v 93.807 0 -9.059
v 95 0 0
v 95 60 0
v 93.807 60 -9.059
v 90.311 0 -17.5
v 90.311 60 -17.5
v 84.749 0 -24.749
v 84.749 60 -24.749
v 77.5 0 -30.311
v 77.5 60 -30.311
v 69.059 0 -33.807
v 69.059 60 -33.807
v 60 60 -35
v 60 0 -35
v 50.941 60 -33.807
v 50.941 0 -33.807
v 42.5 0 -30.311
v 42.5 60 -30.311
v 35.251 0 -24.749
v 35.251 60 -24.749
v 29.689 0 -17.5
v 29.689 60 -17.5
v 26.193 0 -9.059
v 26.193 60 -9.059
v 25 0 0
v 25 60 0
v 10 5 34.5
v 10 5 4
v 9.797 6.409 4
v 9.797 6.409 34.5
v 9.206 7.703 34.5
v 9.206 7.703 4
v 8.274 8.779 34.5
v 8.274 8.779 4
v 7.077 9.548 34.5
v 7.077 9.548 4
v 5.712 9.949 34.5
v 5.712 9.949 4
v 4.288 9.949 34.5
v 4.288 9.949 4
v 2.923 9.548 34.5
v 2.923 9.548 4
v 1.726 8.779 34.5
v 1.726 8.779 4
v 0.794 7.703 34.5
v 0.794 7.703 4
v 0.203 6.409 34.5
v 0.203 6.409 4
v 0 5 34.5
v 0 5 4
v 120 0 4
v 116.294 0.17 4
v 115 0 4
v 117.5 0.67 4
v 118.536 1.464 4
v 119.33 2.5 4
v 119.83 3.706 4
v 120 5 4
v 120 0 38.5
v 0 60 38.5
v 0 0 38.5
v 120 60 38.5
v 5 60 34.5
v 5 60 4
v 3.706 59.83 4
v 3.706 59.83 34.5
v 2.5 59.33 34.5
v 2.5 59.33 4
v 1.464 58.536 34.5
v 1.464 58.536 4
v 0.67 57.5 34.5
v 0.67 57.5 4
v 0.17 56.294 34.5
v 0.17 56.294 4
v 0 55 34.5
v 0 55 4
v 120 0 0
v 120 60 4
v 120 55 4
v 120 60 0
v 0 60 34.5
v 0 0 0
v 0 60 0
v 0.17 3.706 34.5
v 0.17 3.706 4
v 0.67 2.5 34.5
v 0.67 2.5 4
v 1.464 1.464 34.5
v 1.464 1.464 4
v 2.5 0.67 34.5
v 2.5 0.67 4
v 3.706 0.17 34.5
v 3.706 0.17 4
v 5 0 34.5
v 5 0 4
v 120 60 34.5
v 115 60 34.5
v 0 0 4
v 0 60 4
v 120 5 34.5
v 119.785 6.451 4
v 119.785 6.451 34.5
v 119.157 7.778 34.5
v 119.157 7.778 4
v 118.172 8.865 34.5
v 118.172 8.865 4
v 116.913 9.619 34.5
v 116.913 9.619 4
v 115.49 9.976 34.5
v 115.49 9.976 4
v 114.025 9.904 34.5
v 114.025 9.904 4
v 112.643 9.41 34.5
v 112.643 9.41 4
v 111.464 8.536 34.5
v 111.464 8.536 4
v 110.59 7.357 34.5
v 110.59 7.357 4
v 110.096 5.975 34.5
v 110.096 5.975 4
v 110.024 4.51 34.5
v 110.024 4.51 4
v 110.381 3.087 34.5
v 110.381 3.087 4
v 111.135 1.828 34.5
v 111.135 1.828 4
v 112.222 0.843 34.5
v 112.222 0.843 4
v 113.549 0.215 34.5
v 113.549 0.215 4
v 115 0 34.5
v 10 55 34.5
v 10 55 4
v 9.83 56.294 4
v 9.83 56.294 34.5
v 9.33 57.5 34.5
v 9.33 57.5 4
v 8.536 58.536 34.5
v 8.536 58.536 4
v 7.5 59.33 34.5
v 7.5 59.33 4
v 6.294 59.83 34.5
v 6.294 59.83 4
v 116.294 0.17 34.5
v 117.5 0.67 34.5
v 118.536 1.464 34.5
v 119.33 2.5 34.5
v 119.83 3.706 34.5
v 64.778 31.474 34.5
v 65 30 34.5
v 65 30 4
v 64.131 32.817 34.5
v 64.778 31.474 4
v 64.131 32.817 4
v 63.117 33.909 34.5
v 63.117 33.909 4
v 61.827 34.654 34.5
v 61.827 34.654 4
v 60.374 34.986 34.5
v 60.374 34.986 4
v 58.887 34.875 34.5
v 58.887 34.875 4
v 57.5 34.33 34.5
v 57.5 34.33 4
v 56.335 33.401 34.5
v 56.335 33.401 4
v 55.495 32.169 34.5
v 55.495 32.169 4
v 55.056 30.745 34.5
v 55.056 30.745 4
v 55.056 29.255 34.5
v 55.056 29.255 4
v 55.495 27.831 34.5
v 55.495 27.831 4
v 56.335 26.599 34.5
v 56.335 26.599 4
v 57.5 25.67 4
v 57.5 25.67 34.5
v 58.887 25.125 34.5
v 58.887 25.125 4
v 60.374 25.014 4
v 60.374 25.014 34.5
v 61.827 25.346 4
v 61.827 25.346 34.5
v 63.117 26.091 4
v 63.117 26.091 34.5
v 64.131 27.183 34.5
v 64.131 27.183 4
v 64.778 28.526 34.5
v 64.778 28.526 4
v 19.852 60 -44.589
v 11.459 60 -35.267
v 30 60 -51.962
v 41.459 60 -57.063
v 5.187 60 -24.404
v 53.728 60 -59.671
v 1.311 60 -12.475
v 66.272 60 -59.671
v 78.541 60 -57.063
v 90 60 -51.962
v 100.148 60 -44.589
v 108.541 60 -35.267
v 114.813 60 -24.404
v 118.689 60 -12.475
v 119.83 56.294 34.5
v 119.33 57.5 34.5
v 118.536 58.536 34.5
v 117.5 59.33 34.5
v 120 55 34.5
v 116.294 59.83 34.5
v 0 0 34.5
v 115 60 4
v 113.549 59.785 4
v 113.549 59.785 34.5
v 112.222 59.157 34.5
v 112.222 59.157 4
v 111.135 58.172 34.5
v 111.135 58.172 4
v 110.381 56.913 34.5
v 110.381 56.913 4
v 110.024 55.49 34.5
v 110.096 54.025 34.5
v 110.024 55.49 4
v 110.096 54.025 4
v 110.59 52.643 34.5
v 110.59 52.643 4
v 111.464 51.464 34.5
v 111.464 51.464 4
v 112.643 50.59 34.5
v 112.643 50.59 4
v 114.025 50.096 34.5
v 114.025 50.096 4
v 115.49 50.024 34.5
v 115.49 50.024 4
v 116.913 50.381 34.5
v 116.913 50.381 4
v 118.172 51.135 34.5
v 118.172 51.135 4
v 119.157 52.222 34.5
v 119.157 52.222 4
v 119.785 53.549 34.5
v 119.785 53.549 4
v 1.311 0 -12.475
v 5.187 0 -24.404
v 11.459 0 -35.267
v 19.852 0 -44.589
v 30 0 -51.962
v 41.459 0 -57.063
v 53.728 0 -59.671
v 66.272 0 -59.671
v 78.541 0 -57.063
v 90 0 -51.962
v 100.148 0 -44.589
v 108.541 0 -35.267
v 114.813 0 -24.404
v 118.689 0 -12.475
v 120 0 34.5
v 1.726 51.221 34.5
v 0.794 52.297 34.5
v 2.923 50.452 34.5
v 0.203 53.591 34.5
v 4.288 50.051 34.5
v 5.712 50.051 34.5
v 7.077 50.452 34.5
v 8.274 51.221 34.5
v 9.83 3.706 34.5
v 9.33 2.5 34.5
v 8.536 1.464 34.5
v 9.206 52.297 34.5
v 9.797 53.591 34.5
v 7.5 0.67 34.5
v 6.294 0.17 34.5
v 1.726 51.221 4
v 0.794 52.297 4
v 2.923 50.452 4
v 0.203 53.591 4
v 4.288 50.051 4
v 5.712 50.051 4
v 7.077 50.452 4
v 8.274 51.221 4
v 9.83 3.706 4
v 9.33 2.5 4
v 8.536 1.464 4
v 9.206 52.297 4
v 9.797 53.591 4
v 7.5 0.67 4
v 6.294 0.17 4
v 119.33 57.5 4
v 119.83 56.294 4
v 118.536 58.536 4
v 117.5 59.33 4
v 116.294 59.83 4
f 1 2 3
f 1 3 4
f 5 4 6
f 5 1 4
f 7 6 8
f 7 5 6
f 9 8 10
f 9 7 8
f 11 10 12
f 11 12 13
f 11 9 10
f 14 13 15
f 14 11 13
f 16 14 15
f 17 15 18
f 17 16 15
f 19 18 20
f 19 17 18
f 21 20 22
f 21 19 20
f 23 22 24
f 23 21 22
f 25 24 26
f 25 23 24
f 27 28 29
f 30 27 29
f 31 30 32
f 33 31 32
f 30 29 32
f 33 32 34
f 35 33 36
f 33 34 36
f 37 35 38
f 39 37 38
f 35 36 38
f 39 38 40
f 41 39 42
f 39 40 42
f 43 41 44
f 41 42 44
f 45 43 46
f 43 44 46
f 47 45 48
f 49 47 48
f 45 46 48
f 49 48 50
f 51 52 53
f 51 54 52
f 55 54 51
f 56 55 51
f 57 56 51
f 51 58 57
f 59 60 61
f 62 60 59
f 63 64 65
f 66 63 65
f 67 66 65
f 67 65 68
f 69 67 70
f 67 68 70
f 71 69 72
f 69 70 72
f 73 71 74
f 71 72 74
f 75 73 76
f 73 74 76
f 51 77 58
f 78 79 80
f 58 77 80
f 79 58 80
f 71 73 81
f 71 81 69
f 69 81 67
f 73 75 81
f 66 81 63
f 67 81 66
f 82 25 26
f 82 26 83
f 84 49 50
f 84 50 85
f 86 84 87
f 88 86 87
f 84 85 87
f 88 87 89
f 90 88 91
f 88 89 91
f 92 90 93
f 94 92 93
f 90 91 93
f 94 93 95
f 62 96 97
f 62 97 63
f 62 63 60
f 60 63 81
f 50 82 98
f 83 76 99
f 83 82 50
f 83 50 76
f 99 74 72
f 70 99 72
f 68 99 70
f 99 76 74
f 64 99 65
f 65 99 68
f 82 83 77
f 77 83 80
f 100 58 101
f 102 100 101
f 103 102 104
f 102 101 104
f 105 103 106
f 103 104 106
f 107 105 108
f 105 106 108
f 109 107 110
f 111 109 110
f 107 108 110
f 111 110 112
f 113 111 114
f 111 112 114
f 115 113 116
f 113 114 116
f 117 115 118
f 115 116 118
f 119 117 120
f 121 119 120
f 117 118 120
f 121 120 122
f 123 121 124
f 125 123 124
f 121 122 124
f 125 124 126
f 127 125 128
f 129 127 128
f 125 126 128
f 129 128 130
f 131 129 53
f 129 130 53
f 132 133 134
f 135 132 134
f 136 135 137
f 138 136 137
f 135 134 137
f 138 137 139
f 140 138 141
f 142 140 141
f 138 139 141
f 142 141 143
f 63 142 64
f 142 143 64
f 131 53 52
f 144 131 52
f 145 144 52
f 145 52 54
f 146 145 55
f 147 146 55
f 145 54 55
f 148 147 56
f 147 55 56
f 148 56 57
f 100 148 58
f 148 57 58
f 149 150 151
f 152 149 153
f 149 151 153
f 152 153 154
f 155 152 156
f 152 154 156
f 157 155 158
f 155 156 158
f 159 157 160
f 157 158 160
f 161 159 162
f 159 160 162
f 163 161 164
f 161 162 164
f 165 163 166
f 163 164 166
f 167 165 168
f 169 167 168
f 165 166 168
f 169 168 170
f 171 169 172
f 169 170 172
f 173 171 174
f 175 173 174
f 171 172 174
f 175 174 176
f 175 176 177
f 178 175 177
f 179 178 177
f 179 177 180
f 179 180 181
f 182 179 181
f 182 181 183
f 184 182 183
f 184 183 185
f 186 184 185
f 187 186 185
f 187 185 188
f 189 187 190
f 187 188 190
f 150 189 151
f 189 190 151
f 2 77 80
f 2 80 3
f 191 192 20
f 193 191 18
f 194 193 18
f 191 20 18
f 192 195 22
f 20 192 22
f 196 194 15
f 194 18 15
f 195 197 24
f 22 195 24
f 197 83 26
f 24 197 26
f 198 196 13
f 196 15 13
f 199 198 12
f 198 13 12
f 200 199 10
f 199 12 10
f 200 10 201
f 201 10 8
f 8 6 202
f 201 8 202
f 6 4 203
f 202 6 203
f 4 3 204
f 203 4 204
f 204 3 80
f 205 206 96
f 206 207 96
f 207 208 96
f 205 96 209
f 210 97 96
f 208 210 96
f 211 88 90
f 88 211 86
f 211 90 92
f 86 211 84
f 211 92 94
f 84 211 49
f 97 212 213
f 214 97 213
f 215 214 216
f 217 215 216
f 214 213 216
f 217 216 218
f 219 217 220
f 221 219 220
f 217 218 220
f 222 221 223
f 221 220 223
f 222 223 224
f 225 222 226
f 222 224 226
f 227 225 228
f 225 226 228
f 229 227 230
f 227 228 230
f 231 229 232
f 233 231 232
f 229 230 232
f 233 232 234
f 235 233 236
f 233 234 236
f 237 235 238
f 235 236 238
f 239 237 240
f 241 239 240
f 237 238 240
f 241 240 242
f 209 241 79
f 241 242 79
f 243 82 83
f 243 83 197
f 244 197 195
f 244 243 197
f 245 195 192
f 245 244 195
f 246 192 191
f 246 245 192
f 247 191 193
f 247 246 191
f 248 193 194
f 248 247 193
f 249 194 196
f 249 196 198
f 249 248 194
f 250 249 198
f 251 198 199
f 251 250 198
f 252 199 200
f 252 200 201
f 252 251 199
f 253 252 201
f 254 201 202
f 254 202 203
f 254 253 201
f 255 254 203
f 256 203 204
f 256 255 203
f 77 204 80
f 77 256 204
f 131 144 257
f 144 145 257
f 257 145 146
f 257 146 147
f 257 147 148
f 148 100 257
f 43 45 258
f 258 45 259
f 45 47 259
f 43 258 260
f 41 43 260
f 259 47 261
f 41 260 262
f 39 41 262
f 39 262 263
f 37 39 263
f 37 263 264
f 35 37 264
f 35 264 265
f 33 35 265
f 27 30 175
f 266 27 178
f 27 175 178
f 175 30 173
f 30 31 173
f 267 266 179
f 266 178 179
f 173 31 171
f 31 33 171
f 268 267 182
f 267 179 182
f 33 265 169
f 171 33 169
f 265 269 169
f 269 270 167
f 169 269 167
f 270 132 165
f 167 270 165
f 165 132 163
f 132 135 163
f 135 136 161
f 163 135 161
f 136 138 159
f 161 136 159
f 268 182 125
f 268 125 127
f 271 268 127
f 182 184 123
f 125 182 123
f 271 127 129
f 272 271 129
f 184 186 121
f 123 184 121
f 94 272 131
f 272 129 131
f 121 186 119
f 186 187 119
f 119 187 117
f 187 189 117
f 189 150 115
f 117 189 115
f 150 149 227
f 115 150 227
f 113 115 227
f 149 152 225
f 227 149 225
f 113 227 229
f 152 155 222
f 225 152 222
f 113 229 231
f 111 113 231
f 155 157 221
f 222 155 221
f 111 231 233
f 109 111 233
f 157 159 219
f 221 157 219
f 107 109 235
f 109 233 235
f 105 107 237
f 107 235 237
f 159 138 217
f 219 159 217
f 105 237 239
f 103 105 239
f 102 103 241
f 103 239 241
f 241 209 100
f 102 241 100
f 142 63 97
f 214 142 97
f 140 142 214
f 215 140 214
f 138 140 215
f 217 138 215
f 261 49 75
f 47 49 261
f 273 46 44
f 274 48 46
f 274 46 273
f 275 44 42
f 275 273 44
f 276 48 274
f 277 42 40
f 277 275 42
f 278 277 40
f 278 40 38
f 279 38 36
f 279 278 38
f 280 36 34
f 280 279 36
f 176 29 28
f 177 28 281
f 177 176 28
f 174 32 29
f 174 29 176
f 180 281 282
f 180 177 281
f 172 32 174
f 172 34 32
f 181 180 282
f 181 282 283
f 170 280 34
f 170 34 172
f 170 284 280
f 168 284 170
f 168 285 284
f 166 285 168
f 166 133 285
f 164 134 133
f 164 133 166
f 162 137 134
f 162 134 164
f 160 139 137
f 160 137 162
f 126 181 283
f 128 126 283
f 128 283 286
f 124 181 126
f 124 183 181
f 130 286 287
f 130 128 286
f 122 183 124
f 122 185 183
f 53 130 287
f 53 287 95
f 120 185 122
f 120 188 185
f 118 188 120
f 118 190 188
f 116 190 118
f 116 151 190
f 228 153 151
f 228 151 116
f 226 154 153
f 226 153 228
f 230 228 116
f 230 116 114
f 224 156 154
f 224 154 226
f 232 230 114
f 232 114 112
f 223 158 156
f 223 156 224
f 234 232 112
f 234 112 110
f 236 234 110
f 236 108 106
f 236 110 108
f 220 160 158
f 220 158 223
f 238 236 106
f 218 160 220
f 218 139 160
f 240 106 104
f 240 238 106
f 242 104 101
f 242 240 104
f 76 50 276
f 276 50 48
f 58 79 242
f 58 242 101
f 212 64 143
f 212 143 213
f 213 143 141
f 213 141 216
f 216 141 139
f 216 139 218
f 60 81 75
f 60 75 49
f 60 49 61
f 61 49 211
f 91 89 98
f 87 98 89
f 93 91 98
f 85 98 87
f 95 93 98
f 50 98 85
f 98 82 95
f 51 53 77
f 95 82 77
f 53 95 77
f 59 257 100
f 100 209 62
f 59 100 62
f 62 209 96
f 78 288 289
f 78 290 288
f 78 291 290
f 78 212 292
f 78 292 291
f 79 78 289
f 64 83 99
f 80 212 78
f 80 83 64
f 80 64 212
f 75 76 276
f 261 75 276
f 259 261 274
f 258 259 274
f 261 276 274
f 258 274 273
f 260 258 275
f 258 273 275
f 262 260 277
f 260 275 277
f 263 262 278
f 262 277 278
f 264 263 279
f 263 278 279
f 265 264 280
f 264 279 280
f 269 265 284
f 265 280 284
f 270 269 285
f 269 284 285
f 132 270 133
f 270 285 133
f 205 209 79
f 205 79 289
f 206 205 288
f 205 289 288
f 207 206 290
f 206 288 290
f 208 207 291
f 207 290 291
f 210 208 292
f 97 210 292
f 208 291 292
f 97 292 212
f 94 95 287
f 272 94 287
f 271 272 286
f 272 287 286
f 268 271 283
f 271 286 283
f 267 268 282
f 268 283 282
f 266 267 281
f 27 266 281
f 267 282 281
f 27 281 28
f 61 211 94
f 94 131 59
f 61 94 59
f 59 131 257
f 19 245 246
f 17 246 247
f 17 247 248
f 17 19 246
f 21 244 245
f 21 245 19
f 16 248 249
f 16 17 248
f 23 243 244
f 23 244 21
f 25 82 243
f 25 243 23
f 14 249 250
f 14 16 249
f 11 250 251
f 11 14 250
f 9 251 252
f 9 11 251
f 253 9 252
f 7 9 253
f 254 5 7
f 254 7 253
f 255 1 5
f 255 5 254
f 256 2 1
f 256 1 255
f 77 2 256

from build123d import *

# Parameters (mm, degrees)
F0_W      = 120
F0_H      = 60
F1_DEPTH  = 4
F2_R      = 5
F3_DEPTH  = 30.5
F5_DEPTH  = 30.5
F7_DEPTH  = 4
F10_DEPTH = 60


with BuildPart() as f1:
    # F0 (on Top) → F1 (new body)
    with BuildSketch(Plane.XY):
        with Locations((60, 30)):
            Rectangle(F0_W, F0_H)
    extrude(amount=F1_DEPTH)

    # F2 (on face) → F3 (join)
    with BuildSketch(Plane.XY.offset(4)):
        with Locations((60, 30)):
            Circle(F2_R)
    extrude(amount=F3_DEPTH)

    # F4 (on face) → F5 (join)
    with BuildSketch(Plane.XY.offset(4)):
        with BuildLine():
            ThreePointArc((0, 55), (5, 50), (10, 55))
            ThreePointArc((10, 55), (8.5355339376, 58.5355338743), (5.0000000895, 60))
            ThreePointArc((5.0000000895, 60), (1.4644661257, 58.5355339376), (0, 55))
        make_face()
        with BuildLine():
            ThreePointArc((10, 5), (5.0000000094, 10), (0, 5.0000000189))
            ThreePointArc((0, 5.0000000189), (1.4644660874, 1.4644661007), (5, 0))
            ThreePointArc((5, 0), (8.5355339059, 1.4644660941), (10, 5))
        make_face()
        with BuildLine():
            ThreePointArc((120, 55), (118.5355339059, 58.5355339059), (115, 60))
            ThreePointArc((115, 60), (111.4644660941, 51.4644660941), (120, 55))
        make_face()
        with BuildLine():
            ThreePointArc((115, 0), (118.5355339059, 1.4644660941), (120, 5))
            ThreePointArc((120, 5), (111.4644660941, 8.5355339059), (115, 0))
        make_face()
    extrude(amount=F5_DEPTH)

    # F6 (on face) → F7 (join)
    with BuildSketch(Plane.XY.offset(34.5)):
        with BuildLine():
            Line((0, 55), (0, 0))
            Line((0, 0), (120, 0))
            Line((120, 0), (120, 60))
            Line((120, 60), (5, 60))
            ThreePointArc((5, 60), (8.5355339059, 58.5355339059), (10, 55))
            ThreePointArc((10, 55), (5, 50), (0, 55))
        make_face()
        with BuildLine():
            Line((0, 60), (0, 55))
            ThreePointArc((0, 55), (1.4644660941, 58.5355339059), (5, 60))
            Line((5, 60), (0, 60))
        make_face()
        with BuildLine():
            ThreePointArc((5, 60), (1.4644660941, 58.5355339059), (0, 55))
            ThreePointArc((0, 55), (5, 50), (10, 55))
            ThreePointArc((10, 55), (8.5355339059, 58.5355339059), (5, 60))
        make_face()
    extrude(amount=F7_DEPTH)


with BuildPart() as f10:
    # F9 (on Front) → F10 (new body)
    with BuildSketch(Plane.XZ):
        with BuildLine():
            ThreePointArc((95, 0), (60, -35), (25, 0))
            Line((25, 0), (0, 0))
            ThreePointArc((0, 0), (60, -60), (120, 0))
            Line((120, 0), (95, 0))
        make_face()
    extrude(amount=-F10_DEPTH)


solid = Compound([f1.part, f10.part])
